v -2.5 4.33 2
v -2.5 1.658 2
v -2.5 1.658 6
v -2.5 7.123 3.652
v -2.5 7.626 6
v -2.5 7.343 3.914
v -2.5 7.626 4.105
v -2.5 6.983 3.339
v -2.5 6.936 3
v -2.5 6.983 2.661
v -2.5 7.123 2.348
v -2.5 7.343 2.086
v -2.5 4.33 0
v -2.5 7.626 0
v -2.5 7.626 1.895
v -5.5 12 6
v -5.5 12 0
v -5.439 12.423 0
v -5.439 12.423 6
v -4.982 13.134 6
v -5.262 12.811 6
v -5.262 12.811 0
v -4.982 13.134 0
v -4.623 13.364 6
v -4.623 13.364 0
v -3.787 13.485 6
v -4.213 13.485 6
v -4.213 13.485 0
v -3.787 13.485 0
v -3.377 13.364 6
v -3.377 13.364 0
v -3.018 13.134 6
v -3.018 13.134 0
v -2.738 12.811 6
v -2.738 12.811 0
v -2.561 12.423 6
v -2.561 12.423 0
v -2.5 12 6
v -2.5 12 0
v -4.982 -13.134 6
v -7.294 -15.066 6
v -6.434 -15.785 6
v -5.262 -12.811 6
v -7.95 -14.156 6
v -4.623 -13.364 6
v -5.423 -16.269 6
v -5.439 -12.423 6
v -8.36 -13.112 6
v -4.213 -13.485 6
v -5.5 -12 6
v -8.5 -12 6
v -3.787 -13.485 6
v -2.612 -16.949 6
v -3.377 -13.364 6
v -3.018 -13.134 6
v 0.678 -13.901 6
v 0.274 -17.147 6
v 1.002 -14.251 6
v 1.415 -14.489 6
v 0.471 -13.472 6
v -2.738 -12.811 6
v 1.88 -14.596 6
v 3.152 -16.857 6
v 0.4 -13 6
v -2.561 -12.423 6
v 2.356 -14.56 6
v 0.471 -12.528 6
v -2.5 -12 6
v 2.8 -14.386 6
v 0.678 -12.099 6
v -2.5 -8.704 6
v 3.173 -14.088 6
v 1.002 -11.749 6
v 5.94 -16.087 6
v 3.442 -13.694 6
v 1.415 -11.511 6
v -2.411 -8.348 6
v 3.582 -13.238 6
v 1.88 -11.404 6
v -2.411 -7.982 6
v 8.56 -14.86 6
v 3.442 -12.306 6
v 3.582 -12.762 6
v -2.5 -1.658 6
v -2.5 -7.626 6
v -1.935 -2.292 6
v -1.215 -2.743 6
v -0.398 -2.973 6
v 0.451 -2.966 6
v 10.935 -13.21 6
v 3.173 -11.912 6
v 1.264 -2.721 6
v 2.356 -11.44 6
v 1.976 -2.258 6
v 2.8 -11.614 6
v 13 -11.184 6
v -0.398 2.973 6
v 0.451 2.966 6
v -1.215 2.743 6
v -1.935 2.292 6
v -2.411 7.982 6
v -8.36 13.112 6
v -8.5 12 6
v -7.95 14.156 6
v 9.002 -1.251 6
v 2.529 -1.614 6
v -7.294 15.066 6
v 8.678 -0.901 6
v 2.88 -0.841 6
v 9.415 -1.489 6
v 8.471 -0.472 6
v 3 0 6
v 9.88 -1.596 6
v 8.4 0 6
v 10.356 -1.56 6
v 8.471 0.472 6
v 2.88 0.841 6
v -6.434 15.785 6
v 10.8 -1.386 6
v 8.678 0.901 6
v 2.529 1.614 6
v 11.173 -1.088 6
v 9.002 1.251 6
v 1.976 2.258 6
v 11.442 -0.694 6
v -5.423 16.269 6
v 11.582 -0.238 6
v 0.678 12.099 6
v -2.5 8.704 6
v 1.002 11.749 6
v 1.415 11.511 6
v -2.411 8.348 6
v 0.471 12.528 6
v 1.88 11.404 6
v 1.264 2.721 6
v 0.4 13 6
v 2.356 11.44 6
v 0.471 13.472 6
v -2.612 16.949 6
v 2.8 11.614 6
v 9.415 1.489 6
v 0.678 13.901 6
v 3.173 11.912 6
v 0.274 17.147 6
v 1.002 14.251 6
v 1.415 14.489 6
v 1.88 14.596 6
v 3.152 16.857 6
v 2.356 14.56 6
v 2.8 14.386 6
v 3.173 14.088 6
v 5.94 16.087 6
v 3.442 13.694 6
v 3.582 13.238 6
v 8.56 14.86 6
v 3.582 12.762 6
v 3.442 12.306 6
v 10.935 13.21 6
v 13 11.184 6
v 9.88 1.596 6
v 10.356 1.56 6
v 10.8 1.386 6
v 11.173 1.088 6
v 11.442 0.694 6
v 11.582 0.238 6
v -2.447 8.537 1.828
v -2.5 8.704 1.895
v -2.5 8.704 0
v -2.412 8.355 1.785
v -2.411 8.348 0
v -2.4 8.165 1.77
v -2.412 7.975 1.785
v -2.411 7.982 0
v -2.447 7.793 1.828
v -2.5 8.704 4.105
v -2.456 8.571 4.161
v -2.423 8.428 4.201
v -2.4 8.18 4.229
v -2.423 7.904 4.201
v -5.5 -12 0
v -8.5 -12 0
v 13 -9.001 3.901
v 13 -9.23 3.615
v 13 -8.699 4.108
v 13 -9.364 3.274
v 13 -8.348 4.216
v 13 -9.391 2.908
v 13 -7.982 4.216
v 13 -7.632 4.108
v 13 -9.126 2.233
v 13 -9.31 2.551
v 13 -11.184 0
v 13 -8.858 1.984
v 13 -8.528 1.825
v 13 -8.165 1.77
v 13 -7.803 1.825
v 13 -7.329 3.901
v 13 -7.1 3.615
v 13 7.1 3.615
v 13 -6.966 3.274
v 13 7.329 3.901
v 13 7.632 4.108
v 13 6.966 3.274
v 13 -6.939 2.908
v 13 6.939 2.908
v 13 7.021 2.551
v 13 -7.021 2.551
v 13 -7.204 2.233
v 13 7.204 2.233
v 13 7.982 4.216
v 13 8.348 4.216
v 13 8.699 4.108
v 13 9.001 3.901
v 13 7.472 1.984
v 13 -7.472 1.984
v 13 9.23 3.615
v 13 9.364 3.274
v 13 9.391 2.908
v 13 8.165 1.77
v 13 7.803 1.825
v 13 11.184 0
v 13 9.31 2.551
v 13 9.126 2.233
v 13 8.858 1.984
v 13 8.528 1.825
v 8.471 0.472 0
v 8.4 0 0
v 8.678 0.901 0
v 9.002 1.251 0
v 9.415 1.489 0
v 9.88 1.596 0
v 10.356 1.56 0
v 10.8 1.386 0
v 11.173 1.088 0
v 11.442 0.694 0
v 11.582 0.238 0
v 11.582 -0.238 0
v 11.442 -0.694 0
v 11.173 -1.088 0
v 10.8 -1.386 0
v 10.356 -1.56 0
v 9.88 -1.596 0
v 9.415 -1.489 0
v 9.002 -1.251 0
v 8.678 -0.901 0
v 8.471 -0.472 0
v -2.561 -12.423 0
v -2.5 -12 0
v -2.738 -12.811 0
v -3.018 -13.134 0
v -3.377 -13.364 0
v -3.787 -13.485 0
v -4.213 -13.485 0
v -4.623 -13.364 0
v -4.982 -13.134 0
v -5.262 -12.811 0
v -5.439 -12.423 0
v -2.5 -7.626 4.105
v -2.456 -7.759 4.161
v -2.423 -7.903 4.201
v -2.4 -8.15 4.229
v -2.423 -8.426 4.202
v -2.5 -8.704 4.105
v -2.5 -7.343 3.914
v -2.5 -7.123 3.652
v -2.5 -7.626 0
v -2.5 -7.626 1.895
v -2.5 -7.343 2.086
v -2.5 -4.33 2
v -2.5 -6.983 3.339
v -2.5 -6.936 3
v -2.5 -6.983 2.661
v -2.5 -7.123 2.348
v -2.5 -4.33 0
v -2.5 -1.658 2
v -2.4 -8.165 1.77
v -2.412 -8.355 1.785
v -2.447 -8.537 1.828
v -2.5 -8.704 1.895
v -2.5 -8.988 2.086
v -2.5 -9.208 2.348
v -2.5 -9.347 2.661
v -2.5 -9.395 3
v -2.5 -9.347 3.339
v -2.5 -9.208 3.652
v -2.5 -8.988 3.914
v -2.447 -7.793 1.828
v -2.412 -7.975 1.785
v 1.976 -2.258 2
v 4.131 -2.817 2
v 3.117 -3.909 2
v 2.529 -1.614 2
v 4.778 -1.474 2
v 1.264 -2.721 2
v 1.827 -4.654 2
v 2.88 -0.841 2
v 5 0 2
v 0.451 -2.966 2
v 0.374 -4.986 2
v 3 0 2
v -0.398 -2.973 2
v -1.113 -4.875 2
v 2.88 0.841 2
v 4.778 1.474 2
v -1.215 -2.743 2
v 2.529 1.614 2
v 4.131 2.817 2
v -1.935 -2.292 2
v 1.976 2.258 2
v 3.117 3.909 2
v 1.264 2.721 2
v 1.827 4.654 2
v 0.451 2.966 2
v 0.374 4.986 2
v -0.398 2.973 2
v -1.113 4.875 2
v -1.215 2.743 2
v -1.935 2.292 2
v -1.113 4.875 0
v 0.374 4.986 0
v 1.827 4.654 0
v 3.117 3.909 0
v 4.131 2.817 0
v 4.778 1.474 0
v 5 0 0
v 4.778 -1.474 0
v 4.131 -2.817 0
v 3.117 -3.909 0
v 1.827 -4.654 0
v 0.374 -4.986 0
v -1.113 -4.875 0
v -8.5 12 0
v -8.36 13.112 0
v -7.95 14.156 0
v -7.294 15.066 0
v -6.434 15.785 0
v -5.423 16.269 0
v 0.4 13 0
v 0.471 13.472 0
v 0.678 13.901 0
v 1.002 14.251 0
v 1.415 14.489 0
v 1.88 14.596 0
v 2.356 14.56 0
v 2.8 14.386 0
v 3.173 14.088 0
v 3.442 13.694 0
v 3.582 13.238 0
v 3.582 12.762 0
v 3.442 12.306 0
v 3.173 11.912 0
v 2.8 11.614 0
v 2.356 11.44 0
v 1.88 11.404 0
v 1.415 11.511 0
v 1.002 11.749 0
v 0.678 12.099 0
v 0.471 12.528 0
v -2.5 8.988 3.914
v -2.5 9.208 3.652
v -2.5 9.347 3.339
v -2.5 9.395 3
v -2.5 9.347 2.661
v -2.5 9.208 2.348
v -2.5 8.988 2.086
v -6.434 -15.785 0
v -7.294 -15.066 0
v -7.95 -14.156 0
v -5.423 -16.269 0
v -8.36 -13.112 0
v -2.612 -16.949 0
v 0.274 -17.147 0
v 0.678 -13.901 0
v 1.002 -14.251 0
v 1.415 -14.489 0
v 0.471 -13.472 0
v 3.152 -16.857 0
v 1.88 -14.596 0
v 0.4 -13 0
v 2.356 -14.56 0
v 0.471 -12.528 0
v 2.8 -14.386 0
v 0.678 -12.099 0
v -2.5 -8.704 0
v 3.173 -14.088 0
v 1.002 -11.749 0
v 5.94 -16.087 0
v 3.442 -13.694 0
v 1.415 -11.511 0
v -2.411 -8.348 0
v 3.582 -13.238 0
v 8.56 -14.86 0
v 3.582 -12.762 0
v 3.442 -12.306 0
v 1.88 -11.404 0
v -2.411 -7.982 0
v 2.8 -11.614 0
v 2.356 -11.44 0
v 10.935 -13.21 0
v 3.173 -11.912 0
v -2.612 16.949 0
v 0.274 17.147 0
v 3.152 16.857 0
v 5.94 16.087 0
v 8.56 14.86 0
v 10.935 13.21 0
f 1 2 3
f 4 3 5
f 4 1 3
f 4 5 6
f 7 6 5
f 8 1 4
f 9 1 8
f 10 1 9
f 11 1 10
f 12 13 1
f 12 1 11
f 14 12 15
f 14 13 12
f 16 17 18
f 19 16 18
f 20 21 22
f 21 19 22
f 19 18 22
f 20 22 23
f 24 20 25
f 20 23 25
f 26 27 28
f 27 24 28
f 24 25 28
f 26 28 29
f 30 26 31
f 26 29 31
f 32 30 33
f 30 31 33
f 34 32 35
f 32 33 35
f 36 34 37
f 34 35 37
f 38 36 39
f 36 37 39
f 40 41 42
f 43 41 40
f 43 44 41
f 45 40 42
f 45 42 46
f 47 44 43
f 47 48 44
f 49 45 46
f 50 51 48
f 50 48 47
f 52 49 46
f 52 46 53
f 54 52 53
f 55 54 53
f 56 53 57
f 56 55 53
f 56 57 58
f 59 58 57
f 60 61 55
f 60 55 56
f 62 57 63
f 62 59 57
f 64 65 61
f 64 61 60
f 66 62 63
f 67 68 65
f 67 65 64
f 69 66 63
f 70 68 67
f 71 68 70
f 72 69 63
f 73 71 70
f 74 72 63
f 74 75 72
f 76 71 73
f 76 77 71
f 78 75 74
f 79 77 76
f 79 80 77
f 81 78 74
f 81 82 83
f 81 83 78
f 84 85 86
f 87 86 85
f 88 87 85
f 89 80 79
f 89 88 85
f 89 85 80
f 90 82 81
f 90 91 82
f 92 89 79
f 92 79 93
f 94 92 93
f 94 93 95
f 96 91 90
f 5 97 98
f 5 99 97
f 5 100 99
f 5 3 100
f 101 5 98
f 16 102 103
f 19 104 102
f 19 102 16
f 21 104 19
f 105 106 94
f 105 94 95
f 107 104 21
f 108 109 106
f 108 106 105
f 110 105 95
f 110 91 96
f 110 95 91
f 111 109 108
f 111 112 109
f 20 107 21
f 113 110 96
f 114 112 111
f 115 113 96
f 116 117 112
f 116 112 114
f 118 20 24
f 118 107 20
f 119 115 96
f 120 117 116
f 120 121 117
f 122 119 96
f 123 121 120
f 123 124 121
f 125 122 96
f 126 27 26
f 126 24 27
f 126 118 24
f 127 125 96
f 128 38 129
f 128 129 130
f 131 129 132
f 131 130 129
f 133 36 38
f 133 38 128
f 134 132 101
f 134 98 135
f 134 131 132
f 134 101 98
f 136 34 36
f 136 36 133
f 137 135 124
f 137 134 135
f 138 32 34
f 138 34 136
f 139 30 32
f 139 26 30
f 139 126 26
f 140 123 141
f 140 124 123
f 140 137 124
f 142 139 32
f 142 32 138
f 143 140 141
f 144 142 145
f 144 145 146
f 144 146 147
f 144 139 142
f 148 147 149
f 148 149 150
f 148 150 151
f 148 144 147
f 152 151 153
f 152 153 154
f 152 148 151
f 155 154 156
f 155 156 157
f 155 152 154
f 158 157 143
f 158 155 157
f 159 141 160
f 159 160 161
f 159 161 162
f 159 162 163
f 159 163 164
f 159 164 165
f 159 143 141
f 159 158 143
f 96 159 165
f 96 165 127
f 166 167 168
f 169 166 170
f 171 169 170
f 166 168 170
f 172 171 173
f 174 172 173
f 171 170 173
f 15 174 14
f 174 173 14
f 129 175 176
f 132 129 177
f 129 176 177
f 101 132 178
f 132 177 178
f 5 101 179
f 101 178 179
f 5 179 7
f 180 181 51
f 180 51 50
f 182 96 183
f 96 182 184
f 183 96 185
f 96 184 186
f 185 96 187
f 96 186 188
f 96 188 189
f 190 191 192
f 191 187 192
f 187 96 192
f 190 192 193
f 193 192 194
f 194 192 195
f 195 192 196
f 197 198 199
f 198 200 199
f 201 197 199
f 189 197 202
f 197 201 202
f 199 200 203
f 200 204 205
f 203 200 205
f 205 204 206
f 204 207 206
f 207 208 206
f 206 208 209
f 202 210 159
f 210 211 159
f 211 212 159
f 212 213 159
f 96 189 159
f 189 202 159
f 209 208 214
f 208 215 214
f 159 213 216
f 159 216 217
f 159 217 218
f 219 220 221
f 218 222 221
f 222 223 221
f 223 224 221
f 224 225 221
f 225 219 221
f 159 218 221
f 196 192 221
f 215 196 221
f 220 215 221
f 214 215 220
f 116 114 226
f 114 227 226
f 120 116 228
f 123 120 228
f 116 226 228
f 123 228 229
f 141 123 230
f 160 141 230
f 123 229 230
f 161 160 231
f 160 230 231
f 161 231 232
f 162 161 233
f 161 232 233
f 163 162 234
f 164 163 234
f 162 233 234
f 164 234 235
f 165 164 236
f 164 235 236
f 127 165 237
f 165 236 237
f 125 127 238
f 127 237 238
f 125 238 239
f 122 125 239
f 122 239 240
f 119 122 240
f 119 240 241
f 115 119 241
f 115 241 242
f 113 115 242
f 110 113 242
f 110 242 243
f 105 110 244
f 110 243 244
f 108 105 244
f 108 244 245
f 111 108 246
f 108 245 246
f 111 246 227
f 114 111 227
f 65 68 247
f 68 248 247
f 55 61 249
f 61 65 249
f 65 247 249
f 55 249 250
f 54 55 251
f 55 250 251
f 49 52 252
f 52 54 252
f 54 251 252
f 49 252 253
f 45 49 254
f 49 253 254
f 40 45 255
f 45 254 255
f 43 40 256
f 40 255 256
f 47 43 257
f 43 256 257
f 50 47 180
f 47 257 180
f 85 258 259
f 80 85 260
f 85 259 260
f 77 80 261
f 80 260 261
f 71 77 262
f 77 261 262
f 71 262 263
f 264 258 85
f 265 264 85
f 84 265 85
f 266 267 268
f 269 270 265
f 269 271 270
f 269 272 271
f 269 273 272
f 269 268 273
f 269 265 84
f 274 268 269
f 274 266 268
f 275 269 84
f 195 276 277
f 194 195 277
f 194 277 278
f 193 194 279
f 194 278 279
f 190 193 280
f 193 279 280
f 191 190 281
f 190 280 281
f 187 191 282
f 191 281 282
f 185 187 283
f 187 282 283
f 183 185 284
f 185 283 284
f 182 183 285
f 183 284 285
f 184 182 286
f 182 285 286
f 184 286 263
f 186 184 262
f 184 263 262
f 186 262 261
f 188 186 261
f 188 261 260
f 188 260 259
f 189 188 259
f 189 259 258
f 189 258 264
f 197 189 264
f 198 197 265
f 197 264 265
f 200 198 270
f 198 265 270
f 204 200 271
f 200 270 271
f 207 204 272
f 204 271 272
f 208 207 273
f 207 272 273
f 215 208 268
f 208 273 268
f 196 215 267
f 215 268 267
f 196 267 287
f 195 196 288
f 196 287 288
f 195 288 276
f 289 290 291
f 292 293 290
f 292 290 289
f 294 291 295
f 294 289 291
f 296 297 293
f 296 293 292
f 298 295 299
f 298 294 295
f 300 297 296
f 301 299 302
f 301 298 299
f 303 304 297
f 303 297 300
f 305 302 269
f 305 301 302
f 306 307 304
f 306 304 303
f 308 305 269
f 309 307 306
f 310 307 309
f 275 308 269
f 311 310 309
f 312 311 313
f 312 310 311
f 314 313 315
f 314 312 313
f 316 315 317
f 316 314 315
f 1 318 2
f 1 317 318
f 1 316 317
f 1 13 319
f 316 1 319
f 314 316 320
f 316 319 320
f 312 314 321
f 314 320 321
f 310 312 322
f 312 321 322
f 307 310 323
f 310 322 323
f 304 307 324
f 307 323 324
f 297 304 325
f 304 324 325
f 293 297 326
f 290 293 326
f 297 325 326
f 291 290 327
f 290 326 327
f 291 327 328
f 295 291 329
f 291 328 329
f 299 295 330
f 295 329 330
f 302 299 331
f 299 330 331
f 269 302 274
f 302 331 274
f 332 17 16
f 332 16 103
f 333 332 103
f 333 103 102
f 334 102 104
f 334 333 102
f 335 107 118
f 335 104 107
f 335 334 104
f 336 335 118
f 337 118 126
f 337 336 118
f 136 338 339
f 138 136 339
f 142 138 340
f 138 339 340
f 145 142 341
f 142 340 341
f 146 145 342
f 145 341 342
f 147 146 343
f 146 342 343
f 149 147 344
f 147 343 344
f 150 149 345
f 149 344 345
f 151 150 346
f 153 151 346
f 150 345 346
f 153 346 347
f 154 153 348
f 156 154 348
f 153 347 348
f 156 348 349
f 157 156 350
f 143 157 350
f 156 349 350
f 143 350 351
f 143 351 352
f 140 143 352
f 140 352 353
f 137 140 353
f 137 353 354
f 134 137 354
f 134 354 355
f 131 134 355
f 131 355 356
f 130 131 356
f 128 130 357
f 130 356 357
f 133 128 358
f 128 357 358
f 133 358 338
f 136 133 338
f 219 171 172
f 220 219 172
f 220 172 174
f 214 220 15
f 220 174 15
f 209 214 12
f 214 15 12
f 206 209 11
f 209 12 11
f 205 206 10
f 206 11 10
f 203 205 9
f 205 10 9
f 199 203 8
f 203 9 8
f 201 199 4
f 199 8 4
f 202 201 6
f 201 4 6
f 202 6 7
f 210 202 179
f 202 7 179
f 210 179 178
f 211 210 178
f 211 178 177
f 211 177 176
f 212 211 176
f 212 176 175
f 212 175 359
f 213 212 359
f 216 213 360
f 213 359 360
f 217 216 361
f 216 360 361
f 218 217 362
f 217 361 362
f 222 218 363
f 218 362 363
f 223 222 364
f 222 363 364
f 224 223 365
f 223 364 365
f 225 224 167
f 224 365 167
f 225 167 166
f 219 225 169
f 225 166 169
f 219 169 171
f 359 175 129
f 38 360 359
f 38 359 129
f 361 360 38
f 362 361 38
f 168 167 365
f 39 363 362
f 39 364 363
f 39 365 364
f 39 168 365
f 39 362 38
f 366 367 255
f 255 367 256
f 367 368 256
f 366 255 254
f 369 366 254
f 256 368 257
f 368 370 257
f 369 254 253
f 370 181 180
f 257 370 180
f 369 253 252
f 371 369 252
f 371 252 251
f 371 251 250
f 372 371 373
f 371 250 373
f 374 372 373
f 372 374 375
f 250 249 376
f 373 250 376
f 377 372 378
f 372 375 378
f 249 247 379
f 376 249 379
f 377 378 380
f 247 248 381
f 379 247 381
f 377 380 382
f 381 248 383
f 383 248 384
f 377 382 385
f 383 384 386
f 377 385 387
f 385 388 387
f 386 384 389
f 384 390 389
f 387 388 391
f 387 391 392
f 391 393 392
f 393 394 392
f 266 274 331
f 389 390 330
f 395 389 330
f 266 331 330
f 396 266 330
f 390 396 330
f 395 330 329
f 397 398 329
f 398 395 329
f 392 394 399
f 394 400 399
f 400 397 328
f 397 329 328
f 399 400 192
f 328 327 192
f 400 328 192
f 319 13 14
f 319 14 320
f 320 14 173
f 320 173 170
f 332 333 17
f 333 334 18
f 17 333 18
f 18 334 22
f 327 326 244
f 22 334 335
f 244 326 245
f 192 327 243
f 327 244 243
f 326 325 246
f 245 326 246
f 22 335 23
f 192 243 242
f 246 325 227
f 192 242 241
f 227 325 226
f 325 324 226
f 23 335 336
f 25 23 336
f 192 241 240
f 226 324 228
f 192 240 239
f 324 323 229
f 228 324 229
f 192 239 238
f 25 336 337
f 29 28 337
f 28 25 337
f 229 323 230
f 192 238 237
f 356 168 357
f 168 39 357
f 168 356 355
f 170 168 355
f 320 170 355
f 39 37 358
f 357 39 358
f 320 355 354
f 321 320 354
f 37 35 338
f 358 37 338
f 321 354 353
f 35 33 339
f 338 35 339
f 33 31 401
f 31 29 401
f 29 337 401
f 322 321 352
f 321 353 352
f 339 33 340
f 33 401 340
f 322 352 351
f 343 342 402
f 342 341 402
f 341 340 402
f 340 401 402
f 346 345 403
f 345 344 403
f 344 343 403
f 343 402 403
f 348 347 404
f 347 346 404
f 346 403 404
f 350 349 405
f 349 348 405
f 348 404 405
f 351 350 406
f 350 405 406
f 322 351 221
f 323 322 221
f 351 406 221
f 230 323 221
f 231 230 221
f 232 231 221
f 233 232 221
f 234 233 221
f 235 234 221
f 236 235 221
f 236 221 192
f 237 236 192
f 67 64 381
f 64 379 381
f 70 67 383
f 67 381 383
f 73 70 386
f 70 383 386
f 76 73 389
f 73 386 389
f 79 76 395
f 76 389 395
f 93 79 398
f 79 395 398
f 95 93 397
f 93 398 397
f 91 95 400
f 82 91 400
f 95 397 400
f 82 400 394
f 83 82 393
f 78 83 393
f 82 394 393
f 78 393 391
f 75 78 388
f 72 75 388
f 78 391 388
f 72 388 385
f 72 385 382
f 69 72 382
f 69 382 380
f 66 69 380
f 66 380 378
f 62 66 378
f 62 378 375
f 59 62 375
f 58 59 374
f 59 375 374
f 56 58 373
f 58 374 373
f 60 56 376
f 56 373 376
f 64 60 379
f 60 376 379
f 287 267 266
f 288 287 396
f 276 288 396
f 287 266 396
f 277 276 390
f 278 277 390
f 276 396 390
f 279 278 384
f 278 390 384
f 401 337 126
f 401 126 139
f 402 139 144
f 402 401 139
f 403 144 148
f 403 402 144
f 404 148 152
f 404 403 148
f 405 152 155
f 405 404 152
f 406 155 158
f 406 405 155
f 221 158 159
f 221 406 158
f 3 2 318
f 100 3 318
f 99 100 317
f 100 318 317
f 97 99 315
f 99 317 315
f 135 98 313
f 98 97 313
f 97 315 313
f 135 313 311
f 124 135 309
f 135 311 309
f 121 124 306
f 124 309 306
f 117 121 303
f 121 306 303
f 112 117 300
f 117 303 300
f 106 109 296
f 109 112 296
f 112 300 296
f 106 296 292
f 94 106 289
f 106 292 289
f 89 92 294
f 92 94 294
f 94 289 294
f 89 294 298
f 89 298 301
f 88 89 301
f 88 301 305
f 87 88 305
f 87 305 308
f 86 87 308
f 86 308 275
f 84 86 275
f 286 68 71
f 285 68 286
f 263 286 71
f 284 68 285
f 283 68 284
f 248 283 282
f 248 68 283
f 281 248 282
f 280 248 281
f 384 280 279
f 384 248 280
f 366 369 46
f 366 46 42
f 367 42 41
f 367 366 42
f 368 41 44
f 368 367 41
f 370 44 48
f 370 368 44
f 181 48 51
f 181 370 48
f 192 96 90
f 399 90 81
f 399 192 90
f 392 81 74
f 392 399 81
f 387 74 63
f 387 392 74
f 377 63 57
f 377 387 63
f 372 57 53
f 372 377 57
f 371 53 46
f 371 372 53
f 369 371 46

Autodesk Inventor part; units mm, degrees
ref_plane "YZ Plane" through (0, 0, 0) normal (1, 0, 0) x (0, 1, 0)
ref_plane "XZ Plane" through (0, 0, 0) normal (0, 1, 0) x (-1, 0, 0)
ref_plane "XY Plane" through (0, 0, 0) normal (0, 0, 1) x (1, 0, 0)
sketch "スケッチ1" plane through (0, 0, 0) normal (0, 0, 1) x (1, 0, 0)
  arc A0 (-2.5, -4.3301) -> (-2.5, 4.3301) centre (0, 0) ccw construction
  arc A1 (-5.423, -16.2691) -> (-5.423, 16.2691) centre (0, 0) ccw
  arc A2 (-2.5, -1.6583) -> (-2.5, 1.6583) centre (0, 0) ccw
  line L0 (-2.5, -12) -> (-2.5, -1.6583)
  line L1 (-2.5, 1.6583) -> (-2.5, 12)
  line L2 (-8.5, -12) -> (-2.5, -12)
  line L3 (-2.5, -12) -> (-2.5, 12)
  line L4 (-2.5, 12) -> (-8.5, 12)
  line L5 (-8.5, 12) -> (-8.5, -12)
  line L6 (-8.5, -12) -> (-2.5, 12) construction
  line L7 (-2.5, -12) -> (-8.5, 12) construction
  line L8 (6.2704, -6.6573) -> (-2.5, -6.6573) construction
  line L9 (-2.5, -6.6573) -> (-2.5, -9.6573) construction
  line L10 (-2.5, -9.6573) -> (6.2704, -9.6573) construction
  line L11 (6.2704, -9.6573) -> (6.2704, -6.6573) construction
  arc A3 (-5.5, -12) -> (-2.5, -12) centre (-4, -12) ccw
  arc A4 (-2.5, 12) -> (-5.5, 12) centre (-4, 12) ccw
  arc A5 (-8.5, -12) -> (-5.423, -16.2691) centre (-4, -12) ccw
  arc A6 (-5.423, 16.2691) -> (-8.5, 12) centre (-4, 12) ccw
  point P0 (-5.5, 0)
  point P1 (-5.5, 0)
  point P2 (-2.5, 13.775)
  point P3 (-2.5, -13.775)
  dimension "d0" = 10
  dimension "d2" = 6
  dimension "d9" = 2.5
  dimension "d10" = 6
  dimension "d11" = 24
  dimension "d12" = 3
  dimension "d14" = 1.5
  dimension "d15" = 3
  dimension "d16" = 3
extrude "押し出し1" add sketch "スケッチ1" along normal blind 6 contours A5 L2 A3 L0 A2 L1 A4 L4 A6 A1
sketch "スケッチ2" plane through (0, 0, 0) normal (0, 0, -1) x (-1, 0, 0)
  circle A0 centre (0, 0) radius 5
  dimension "d6" = 10
extrude "押し出し2" cut sketch "スケッチ2" against normal blind 2
sketch "スケッチ4" plane through (0, 0, 0) normal (0, 0, -1) x (-1, 0, 0)
  arc A0 (2.5, 4.3301) -> (2.5, -4.3301) centre (0, 0) ccw projected
  line L0 (2.5, 4.3301) -> (2.5, 12) projected
  arc A1 (5.5, 12) -> (2.5, 12) centre (4, 12) ccw projected
  line L1 (5.5, 12) -> (8.5, 12) projected
  arc A2 (8.5, 12) -> (5.423, 16.2691) centre (4, 12) ccw projected
  arc A3 (5.423, 16.2691) -> (5.423, -16.2691) centre (0, 0) ccw projected
  arc A4 (5.423, -16.2691) -> (8.5, -12) centre (4, -12) ccw projected
  line L2 (8.5, -12) -> (5.5, -12) projected
  arc A5 (2.5, -12) -> (5.5, -12) centre (4, -12) ccw projected
  line L3 (2.5, -12) -> (2.5, -4.3301) projected
  arc A6 (2.5, -7.6265) -> (2.5, -8.7036) centre (3.9, -8.1651) ccw
  arc A7 (2.5, 8.7036) -> (2.5, 7.6265) centre (3.9, 8.1651) ccw
  point P0 (2.4, 8.1651)
  point P1 (2.5, 8.1651)
  point P2 (2.4, -8.1651)
  point P3 (2.5, -8.1651)
  dimension "d17" = 1.5
  dimension "d18" = 0.1
extrude "押し出し3" cut sketch "スケッチ4" against normal through all contours A7 L0 | L3 A6
sketch "スケッチ5" plane through (0, 0, 0) normal (0, 0, -1) x (-1, 0, 0)
  arc A0 (2.5, -7.6265) -> (2.5, -8.7036) centre (3.9, -8.1651) ccw projected
  line L0 (2.5, -7.6265) -> (2.5, -4.3301) projected
  arc A1 (2.5, 4.3301) -> (2.5, -4.3301) centre (0, 0) ccw projected
  line L1 (2.5, 4.3301) -> (2.5, 7.6265) projected
  arc A2 (2.5, 8.7036) -> (2.5, 7.6265) centre (3.9, 8.1651) ccw projected
  line L2 (2.5, 8.7036) -> (2.5, 12) projected
  arc A3 (5.5, 12) -> (2.5, 12) centre (4, 12) ccw projected
  line L3 (5.5, 12) -> (8.5, 12) projected
  arc A4 (8.5, 12) -> (5.423, 16.2691) centre (4, 12) ccw projected
  arc A5 (5.423, 16.2691) -> (5.423, -16.2691) centre (0, 0) ccw projected
  arc A6 (5.423, -16.2691) -> (8.5, -12) centre (4, -12) ccw projected
  line L4 (8.5, -12) -> (5.5, -12) projected
  arc A7 (2.5, -12) -> (5.5, -12) centre (4, -12) ccw projected
  line L5 (2.5, -12) -> (2.5, -8.7036) projected
  line L6 (3.9, -8.1651) -> (-13, -8.1651) construction
  line L7 (3.9, 8.1651) -> (-13, 8.1651) construction
  line L8 (-13, -11.1845) -> (-13, 11.1845)
  circle A8 centre (-10, 0) radius 1.6
  circle A9 centre (-2, -13) radius 1.6
  circle A10 centre (-2, 13) radius 1.6
  line L9 (-2, -13) -> (-2, 13)
  point P0 (-2, 0)
  dimension "d21" = 13
  dimension "d22" = 3.2
  dimension "d23" = 10
  dimension "d24" = 3.2
  dimension "d25" = 3.2
  dimension "d26" = 26
  dimension "d27" = 2
extrude "押し出し4" cut sketch "スケッチ5" against normal through all contours A9 | A10 | A5 L8 | A8
sketch "スケッチ6" plane through (13, -11.1845, 0) normal (1, 0, 0) x (0, 0, -1)
  line L0 (0, 3.5579) -> (0, 2.4809) projected
  line L1 (0, 19.888) -> (0, 18.811) projected
  line L2 (0, 19.3495) -> (-3, 19.3495)
  line L3 (0, 3.0194) -> (-3, 3.0194)
  point P0 (0, 11.1845)
  dimension "d30" = 3
hole "穴1" at (13, 8.1651, 3) at (13, -8.1651, 3) direction (-1, 0, 0) diameter 2.459 end through all thread size "M3x0.5" class "6H" standard "ISO Metric profile"
equation "\"d16\" = d15"
properties part number "D留め板"
